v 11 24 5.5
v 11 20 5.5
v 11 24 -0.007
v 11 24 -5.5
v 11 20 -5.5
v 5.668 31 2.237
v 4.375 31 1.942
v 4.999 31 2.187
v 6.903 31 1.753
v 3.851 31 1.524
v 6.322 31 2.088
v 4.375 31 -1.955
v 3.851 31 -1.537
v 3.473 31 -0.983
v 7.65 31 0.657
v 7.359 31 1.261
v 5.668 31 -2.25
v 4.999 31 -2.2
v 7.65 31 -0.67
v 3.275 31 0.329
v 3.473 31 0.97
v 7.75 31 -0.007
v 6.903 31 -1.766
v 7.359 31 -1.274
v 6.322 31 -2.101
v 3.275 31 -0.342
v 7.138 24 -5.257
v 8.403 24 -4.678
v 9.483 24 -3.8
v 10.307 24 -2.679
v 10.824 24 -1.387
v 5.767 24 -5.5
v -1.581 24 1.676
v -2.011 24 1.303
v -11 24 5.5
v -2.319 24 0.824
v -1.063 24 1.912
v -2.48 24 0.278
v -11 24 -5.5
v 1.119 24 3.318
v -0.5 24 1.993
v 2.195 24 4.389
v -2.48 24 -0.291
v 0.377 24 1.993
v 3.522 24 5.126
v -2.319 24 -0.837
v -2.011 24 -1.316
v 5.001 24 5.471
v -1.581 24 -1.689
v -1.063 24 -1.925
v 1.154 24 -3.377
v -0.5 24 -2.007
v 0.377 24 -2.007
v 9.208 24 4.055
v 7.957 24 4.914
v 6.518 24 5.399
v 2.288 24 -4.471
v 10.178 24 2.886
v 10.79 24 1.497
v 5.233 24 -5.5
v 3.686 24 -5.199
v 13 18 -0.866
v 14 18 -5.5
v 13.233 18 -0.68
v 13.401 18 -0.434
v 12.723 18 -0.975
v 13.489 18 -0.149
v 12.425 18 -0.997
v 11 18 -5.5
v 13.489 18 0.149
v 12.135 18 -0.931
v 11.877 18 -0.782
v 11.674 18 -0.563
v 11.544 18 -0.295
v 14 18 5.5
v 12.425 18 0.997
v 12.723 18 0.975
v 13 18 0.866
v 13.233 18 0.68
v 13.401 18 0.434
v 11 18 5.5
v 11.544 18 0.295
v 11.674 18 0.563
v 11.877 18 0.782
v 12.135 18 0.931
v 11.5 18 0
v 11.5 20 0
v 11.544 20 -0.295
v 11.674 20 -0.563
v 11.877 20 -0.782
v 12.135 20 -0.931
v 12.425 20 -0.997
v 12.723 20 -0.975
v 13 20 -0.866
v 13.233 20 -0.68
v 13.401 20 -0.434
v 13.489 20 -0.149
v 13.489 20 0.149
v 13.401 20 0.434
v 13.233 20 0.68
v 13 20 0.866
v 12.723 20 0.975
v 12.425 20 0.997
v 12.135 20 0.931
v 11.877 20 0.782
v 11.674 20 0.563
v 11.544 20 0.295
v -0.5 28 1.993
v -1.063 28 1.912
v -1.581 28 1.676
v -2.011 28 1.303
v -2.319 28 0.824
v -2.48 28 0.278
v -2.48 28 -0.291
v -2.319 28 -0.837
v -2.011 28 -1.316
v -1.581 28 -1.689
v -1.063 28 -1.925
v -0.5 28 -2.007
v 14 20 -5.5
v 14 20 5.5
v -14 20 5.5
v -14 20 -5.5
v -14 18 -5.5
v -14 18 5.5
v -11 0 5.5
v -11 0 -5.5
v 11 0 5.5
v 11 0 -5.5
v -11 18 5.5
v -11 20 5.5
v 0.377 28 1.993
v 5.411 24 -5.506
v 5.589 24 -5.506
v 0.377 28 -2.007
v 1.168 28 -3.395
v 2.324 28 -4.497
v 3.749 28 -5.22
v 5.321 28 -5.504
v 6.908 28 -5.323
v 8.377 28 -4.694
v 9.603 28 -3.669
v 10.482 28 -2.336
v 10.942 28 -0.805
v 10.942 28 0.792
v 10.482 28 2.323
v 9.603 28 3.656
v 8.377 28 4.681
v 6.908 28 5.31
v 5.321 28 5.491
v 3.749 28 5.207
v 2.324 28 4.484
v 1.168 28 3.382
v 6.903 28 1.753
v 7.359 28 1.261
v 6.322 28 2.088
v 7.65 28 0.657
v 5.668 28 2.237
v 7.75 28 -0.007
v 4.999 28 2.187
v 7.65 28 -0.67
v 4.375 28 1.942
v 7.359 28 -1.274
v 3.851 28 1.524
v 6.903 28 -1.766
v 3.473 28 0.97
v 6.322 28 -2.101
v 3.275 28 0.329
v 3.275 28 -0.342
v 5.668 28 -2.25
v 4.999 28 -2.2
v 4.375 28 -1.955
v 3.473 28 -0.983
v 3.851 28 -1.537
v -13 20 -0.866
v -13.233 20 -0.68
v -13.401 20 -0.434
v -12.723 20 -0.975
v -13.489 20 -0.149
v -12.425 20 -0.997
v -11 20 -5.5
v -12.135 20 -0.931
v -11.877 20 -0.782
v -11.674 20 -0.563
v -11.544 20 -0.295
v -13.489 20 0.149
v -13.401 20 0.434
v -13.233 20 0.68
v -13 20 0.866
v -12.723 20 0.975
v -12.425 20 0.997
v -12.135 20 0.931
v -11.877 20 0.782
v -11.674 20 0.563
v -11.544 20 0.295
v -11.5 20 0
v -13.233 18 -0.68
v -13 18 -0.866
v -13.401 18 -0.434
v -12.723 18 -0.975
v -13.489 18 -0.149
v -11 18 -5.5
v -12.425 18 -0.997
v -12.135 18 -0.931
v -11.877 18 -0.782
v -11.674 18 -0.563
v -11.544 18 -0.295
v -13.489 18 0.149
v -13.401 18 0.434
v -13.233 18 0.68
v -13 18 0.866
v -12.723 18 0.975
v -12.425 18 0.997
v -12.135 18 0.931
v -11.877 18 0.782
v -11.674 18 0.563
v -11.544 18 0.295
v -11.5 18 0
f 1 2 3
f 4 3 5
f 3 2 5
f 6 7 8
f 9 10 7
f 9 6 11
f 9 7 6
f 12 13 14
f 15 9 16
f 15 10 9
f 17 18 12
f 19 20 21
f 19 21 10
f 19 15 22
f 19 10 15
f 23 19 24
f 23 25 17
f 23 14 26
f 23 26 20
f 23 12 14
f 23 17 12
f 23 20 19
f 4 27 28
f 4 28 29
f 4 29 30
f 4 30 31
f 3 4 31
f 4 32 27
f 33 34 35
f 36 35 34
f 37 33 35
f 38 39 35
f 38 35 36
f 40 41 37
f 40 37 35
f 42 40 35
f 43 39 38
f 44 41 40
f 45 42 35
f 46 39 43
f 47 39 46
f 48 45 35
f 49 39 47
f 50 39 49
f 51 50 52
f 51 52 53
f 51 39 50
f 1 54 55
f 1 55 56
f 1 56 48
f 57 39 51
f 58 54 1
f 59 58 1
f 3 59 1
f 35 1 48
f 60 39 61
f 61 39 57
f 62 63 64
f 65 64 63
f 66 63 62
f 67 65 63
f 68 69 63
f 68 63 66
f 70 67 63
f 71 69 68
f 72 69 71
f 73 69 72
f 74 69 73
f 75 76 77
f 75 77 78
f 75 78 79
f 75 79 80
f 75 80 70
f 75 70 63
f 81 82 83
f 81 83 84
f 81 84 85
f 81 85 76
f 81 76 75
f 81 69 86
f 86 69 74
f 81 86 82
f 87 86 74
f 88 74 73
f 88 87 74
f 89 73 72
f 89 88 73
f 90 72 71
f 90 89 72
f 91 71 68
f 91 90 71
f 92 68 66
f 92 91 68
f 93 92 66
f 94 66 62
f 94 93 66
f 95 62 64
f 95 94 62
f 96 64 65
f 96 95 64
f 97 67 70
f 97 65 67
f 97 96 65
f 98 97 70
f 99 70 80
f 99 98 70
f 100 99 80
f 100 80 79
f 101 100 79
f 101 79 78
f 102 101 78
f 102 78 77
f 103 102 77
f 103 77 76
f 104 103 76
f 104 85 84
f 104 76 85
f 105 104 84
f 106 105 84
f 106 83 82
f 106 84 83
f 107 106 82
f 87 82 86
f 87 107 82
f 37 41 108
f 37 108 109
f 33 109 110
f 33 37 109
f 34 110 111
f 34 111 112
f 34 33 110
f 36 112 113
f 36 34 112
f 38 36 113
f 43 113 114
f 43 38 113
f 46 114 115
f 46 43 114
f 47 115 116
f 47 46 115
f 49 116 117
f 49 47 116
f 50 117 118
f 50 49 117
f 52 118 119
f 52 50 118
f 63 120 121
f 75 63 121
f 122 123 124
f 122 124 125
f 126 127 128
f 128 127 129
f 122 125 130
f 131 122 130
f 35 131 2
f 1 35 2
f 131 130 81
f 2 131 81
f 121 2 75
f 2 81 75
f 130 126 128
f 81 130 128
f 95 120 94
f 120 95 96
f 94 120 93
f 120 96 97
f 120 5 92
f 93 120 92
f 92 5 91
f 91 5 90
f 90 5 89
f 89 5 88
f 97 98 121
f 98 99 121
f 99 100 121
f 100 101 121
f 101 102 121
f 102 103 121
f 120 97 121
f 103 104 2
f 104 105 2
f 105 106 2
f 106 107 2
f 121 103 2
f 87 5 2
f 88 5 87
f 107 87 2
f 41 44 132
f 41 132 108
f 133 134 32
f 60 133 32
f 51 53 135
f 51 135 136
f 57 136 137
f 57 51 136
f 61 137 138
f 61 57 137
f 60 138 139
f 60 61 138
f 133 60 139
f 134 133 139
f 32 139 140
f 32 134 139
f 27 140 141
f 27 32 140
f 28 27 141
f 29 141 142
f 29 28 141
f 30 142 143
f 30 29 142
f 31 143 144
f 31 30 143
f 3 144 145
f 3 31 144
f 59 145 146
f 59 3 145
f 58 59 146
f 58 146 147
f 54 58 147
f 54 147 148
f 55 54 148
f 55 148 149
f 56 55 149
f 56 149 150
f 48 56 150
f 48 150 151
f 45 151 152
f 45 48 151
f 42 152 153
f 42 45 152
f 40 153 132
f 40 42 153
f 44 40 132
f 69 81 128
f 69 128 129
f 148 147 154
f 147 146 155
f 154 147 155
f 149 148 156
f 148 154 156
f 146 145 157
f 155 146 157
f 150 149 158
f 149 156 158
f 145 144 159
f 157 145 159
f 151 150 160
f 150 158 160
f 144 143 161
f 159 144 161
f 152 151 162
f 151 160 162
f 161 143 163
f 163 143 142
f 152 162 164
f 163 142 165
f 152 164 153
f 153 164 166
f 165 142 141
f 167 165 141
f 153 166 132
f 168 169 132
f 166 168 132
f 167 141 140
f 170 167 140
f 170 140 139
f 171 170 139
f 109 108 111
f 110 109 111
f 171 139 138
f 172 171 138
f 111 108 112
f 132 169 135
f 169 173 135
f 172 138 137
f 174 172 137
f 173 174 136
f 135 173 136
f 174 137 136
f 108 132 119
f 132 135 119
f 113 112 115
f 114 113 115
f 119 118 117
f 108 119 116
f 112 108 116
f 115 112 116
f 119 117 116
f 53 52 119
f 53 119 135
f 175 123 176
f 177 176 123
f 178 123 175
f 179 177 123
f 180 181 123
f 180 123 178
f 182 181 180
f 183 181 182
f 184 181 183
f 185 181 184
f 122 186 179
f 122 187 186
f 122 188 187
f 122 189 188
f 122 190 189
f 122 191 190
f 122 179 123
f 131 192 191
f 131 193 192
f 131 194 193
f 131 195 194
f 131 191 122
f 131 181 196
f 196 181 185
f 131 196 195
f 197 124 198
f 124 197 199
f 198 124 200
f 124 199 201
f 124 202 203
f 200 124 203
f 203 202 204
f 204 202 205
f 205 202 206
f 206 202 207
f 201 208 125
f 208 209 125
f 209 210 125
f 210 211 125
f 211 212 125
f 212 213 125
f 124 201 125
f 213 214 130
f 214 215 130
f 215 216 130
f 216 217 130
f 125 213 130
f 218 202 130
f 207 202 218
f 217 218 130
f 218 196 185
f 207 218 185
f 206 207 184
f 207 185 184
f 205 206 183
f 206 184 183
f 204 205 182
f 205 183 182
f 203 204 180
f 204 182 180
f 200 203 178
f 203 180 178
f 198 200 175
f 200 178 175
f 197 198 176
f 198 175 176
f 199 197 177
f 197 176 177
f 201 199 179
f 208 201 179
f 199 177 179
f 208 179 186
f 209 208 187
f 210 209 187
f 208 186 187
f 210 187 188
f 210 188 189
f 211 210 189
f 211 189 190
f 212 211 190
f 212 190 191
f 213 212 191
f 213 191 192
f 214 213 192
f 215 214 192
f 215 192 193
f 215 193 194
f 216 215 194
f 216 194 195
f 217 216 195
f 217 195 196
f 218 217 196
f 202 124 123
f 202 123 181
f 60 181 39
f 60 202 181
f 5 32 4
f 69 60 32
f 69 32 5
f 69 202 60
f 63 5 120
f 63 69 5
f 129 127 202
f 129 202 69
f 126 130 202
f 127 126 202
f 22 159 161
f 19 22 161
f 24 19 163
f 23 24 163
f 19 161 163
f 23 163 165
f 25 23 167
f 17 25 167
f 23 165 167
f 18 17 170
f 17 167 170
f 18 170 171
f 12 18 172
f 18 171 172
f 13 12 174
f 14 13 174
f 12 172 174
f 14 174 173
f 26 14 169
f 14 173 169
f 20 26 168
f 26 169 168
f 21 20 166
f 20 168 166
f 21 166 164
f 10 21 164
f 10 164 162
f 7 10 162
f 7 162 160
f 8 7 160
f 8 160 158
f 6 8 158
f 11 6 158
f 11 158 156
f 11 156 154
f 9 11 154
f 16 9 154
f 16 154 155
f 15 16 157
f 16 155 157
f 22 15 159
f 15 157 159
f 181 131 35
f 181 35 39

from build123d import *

# Parameters (mm, degrees)
SKETCH1_W           = 22
SKETCH1_H           = 11
BOSS_EXTRUDE1_DEPTH = 24
BOSS_EXTRUDE2_DEPTH = 4
SKETCH4_W           = 11
SKETCH4_H           = 2
BOSS_EXTRUDE3_DEPTH = 3
SKETCH5_R           = 1
CUT_EXTRUDE2_DEPTH  = 21
SKETCH3_R           = 2.25
BOSS_EXTRUDE4_DEPTH = 3


with BuildPart() as part:
    # Sketch1 → Boss-Extrude1 (new body)
    with BuildSketch(Plane(origin=(0, 0, 0), x_dir=(1, 0, 0), z_dir=(0, 1, 0))):
        Rectangle(SKETCH1_W, SKETCH1_H)
    extrude(amount=BOSS_EXTRUDE1_DEPTH)

    # Sketch2 → Boss-Extrude2 (add)
    with BuildSketch(Plane(origin=(0, 24, 0), x_dir=(1, 0, 0), z_dir=(0, 1, 0))):
        with BuildLine():
            Line((-0.5, 2.006506876), (0.376524617, 2.006506876))
            ThreePointArc((0.376524617, 2.006506876), (11, 0.006506876), (0.376524617, -1.993493124))
            Line((0.376524617, -1.993493124), (-0.5, -1.993493124))
            ThreePointArc((-0.5, -1.993493124), (-2.5, 0.006506876), (-0.5, 2.006506876))
        make_face()
    extrude(amount=BOSS_EXTRUDE2_DEPTH)

    # Sketch4 → Boss-Extrude3 (add)
    with BuildSketch(Plane.ZY.offset(11)):
        with Locations((0, 19)):
            Rectangle(SKETCH4_W, SKETCH4_H)
    boss_extrude3 = extrude(amount=BOSS_EXTRUDE3_DEPTH)

    # Sketch5 → Cut-Extrude2 (cut, through all)
    with BuildSketch(Plane(origin=(0, 20, 0), x_dir=(1, 0, 0), z_dir=(0, 1, 0))):
        with Locations((-12.5, 0)):
            Circle(SKETCH5_R)
    cut_extrude2 = extrude(amount=-CUT_EXTRUDE2_DEPTH, mode=Mode.SUBTRACT)

    # Mirror1: Boss-Extrude3, Cut-Extrude2 across plane
    add(boss_extrude3.mirror(Plane(origin=(0, 0, 0), x_dir=(0, 0, 1), z_dir=(1, 0, 0))))
    add(cut_extrude2.mirror(Plane(origin=(0, 0, 0), x_dir=(0, 0, 1), z_dir=(1, 0, 0))), mode=Mode.SUBTRACT)

    # Sketch3 → Boss-Extrude4 (add)
    with BuildSketch(Plane(origin=(0, 28, 0), x_dir=(1, 0, 0), z_dir=(0, 1, 0))):
        with Locations((5.5, 0.006506876)):
            Circle(SKETCH3_R)
    extrude(amount=BOSS_EXTRUDE4_DEPTH)


solid = part.part
